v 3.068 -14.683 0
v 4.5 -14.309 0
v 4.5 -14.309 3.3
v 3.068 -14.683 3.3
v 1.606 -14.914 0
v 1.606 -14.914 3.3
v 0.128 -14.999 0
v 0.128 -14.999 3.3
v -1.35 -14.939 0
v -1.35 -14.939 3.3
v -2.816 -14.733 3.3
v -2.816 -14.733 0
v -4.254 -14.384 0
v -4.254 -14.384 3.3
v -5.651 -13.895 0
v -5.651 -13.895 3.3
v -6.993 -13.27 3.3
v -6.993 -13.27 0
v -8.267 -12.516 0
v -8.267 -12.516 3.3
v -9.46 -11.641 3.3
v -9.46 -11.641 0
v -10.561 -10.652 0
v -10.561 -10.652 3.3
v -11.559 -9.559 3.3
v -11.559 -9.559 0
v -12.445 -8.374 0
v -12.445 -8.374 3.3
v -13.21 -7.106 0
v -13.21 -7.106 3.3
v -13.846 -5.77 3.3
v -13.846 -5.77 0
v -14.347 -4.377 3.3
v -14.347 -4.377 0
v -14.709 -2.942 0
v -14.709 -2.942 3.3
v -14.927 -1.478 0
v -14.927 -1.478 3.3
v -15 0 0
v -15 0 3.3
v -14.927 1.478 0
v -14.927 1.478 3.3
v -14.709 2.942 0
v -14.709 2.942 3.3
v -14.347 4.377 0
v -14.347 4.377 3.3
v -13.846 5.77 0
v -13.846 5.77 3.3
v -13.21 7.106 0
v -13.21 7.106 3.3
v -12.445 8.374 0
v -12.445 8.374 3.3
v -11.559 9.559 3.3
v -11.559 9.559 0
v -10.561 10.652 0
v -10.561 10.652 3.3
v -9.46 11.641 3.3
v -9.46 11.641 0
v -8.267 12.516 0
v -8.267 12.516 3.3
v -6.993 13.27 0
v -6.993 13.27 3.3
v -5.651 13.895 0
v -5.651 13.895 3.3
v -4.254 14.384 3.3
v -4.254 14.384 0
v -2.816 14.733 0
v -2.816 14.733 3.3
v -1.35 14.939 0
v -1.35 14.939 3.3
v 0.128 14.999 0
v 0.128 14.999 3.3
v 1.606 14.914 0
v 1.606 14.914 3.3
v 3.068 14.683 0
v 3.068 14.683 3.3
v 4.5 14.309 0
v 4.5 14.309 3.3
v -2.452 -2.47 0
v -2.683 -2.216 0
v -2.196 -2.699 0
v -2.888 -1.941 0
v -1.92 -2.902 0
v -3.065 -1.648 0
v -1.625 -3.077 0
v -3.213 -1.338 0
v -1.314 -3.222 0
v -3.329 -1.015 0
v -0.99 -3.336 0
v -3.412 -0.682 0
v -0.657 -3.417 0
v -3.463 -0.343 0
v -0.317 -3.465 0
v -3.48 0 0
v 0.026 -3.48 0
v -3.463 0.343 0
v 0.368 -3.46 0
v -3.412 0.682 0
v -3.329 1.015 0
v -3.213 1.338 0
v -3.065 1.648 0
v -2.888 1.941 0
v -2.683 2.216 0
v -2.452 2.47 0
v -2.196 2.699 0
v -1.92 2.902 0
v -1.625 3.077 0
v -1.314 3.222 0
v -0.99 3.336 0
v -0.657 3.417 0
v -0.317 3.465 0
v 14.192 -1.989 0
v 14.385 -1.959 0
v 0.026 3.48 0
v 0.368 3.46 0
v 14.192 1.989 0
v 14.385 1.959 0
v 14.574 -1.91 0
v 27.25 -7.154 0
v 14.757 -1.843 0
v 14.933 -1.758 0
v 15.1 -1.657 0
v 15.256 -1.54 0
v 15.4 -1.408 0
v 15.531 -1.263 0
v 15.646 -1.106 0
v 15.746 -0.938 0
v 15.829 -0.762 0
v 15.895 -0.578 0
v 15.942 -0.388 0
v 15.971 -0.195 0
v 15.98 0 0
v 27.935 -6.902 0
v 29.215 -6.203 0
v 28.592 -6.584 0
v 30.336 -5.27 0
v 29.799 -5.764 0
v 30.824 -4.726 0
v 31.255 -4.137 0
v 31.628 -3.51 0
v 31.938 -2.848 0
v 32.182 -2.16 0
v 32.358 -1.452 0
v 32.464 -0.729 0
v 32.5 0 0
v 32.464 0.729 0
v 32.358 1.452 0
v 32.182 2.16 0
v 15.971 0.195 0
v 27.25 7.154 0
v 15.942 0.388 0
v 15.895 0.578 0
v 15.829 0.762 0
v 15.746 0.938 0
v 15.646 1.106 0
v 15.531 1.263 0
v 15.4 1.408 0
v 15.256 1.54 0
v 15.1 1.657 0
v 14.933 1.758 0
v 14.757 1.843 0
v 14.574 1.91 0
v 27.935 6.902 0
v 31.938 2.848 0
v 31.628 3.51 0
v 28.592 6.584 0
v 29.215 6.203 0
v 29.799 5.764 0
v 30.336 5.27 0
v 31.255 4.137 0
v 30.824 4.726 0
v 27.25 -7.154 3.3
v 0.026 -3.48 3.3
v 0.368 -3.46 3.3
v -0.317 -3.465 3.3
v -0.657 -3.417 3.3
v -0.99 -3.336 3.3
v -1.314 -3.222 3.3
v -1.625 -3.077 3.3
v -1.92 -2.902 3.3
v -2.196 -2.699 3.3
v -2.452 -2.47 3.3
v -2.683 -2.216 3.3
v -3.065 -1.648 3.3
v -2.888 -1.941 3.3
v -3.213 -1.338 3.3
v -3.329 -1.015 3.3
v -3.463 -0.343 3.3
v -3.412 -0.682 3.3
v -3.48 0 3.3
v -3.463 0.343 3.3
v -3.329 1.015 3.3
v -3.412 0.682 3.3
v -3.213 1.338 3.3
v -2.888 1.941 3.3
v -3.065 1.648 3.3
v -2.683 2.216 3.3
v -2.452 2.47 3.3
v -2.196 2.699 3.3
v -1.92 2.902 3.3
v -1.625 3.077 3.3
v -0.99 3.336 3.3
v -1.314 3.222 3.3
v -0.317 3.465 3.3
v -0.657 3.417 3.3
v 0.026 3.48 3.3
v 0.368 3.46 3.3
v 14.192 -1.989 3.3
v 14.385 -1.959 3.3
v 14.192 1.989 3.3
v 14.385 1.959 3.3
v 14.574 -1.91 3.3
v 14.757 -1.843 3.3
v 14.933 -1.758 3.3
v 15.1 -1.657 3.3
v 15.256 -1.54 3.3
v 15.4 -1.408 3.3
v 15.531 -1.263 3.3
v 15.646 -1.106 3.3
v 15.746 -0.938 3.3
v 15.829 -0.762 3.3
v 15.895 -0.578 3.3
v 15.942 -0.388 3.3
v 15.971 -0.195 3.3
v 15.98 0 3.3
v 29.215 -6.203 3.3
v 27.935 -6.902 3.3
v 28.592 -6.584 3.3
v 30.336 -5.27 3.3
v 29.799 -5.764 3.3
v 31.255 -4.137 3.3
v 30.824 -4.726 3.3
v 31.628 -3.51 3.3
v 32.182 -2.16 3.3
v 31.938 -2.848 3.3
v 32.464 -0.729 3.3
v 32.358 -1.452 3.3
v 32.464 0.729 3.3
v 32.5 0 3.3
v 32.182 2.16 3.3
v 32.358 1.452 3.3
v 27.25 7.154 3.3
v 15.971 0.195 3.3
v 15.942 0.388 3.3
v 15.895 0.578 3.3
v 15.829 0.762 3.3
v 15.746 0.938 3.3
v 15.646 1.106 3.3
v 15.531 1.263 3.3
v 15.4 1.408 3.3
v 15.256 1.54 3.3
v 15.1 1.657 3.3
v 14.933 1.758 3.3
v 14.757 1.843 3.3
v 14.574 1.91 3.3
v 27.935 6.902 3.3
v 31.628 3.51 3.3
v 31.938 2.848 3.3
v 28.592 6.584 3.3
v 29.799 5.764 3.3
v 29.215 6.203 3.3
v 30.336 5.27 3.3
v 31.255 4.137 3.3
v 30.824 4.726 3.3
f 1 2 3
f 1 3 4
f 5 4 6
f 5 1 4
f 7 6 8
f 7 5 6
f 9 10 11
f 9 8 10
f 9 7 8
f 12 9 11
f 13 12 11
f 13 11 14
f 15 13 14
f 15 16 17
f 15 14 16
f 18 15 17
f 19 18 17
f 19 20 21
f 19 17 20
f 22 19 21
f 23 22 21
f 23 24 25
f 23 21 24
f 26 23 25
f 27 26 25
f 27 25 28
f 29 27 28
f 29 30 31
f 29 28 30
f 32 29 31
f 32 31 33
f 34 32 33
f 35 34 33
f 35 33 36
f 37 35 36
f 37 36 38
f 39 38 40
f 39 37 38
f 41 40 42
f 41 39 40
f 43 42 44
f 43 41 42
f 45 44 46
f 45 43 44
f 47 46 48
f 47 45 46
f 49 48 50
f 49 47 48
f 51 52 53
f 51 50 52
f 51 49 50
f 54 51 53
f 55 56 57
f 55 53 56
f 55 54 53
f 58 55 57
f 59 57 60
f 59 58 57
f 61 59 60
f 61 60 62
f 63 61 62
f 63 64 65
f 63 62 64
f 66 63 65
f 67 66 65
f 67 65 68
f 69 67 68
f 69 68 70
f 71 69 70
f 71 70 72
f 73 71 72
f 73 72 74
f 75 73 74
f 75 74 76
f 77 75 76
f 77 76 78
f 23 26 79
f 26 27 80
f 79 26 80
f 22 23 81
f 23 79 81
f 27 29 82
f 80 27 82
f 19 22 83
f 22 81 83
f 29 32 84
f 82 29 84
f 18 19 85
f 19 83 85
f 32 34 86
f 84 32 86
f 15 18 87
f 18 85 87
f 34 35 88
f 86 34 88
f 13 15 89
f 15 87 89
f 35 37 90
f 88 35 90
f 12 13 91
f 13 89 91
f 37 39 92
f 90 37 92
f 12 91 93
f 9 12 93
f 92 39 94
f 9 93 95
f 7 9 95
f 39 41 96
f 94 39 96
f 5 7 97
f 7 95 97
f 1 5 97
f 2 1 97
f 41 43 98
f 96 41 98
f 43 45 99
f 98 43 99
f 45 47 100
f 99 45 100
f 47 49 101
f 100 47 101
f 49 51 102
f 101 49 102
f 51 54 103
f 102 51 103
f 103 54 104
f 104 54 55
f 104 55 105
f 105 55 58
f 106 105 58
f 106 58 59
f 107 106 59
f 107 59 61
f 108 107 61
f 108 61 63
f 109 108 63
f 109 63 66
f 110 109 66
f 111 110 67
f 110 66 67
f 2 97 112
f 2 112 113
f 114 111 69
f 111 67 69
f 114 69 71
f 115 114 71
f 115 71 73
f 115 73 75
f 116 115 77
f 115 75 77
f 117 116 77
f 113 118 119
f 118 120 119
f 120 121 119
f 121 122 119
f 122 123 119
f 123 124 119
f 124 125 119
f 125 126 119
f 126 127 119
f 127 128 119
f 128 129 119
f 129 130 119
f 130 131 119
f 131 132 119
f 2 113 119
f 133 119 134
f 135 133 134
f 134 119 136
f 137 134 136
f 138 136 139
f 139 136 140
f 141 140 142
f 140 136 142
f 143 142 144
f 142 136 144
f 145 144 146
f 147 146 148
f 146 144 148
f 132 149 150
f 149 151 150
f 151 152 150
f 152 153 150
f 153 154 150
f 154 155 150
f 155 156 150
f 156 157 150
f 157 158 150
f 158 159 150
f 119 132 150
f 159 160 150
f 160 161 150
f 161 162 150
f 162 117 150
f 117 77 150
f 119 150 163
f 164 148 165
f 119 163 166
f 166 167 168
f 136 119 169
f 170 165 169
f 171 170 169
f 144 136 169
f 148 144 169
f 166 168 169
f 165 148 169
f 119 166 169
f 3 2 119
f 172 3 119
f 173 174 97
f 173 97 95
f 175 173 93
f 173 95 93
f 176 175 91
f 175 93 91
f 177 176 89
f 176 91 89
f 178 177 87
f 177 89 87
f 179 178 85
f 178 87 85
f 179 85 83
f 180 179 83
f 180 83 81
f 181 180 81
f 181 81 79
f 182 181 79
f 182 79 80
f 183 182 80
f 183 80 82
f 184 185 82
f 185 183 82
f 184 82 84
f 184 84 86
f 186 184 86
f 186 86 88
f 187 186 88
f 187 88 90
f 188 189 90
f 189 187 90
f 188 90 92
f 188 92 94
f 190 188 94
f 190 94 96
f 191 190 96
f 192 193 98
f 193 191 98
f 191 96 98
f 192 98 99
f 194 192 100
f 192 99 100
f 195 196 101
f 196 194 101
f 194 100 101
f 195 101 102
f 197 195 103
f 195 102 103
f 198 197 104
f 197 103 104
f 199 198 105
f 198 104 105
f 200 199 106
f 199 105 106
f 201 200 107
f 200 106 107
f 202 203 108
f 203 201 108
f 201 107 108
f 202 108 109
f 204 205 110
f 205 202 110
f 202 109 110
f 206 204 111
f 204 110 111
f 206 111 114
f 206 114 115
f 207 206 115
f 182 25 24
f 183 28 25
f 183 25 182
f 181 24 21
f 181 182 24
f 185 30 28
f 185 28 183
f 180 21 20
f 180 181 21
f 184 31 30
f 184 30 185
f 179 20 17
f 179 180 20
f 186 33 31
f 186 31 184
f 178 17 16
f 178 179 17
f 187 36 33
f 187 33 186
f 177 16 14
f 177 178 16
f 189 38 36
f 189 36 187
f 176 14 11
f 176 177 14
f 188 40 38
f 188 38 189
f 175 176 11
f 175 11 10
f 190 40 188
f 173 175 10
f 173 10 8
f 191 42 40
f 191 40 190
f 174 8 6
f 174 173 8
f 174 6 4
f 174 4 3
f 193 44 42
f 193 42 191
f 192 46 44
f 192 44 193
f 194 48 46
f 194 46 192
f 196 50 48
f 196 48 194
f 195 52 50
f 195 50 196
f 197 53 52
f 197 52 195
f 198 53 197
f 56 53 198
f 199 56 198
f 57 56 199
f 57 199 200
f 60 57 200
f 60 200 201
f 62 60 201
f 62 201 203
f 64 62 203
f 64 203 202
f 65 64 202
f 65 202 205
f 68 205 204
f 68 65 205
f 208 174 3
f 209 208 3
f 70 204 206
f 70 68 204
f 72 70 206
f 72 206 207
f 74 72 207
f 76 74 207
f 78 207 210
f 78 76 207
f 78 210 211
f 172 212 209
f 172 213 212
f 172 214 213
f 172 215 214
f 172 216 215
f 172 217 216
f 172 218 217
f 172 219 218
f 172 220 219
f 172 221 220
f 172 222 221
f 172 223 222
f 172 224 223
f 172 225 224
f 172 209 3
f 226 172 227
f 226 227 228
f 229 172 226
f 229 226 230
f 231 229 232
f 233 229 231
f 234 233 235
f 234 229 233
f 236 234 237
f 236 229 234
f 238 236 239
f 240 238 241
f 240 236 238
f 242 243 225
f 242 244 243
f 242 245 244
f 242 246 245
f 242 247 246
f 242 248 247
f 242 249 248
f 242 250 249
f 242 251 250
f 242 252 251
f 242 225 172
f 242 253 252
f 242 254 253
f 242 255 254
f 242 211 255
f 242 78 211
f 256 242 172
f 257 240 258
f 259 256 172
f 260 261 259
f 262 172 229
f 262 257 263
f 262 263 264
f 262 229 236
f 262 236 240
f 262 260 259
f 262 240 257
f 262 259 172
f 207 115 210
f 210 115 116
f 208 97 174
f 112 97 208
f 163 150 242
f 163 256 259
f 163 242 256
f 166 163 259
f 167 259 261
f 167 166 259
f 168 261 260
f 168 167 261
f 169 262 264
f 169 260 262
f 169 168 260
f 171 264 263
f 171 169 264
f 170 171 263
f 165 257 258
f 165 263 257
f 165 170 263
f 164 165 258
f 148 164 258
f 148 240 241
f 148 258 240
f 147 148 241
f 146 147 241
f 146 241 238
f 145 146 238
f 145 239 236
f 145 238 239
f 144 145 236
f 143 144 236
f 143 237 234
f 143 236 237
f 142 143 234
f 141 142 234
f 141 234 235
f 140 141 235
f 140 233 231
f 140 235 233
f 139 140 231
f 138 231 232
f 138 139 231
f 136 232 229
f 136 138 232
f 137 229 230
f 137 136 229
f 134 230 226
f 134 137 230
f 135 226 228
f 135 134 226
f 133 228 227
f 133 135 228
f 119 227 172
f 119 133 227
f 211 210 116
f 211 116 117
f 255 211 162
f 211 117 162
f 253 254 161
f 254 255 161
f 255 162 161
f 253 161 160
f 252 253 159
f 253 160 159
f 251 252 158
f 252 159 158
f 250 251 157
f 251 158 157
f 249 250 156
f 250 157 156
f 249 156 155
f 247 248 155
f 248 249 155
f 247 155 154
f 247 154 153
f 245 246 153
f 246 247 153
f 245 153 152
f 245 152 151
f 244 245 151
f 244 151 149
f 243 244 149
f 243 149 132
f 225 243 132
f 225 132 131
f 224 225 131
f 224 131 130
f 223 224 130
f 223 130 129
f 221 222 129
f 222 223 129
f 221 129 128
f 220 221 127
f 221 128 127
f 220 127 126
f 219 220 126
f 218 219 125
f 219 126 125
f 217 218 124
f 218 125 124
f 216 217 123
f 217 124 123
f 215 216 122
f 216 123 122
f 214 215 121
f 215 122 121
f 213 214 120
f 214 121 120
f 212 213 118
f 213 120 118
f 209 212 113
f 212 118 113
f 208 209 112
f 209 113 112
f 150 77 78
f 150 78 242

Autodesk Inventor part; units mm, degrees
ref_plane "YZ Plane" through (0, 0, 0) normal (1, 0, 0) x (0, 1, 0)
ref_plane "XZ Plane" through (0, 0, 0) normal (0, 1, 0) x (-1, 0, 0)
ref_plane "XY Plane" through (0, 0, 0) normal (0, 0, 1) x (1, 0, 0)
sketch "Sketch1" plane through (0, 0, 0) normal (0, 0, 1) x (1, 0, 0)
  line L0 (0.3684, -3.4604) -> (14.1917, -1.9888)
  arc A0 (0.3684, 3.4604) -> (0.3684, -3.4604) centre (0, 0) ccw
  line L1 (0.3684, 3.4604) -> (14.1917, 1.9888)
  arc A1 (14.1917, -1.9888) -> (14.1917, 1.9888) centre (13.98, 0) ccw
  line L2 (4.5, -14.3091) -> (27.25, -7.1545)
  line L3 (4.5, 14.3091) -> (27.25, 7.1545)
  arc A2 (27.25, -7.1545) -> (27.25, 7.1545) centre (25, 0) ccw
  arc A3 (4.5, 14.3091) -> (4.5, -14.3091) centre (0, 0) ccw
  dimension "d13" = 3.48
  dimension "d14" = 2
  dimension "d15" = 19.46
  dimension "d17" = 15
  dimension "d18" = 7.5
  dimension "d19" = 25
extrude "Extrusion2" add sketch "Sketch1" along normal blind 3.3
equation "\"d17\" = radio_muslo"
equation "\"d18\" = 0.5 * radio_muslo"
equation "\"radio_muslo\" = 15"
properties part number "Pata - Soporte Antebrazo"
